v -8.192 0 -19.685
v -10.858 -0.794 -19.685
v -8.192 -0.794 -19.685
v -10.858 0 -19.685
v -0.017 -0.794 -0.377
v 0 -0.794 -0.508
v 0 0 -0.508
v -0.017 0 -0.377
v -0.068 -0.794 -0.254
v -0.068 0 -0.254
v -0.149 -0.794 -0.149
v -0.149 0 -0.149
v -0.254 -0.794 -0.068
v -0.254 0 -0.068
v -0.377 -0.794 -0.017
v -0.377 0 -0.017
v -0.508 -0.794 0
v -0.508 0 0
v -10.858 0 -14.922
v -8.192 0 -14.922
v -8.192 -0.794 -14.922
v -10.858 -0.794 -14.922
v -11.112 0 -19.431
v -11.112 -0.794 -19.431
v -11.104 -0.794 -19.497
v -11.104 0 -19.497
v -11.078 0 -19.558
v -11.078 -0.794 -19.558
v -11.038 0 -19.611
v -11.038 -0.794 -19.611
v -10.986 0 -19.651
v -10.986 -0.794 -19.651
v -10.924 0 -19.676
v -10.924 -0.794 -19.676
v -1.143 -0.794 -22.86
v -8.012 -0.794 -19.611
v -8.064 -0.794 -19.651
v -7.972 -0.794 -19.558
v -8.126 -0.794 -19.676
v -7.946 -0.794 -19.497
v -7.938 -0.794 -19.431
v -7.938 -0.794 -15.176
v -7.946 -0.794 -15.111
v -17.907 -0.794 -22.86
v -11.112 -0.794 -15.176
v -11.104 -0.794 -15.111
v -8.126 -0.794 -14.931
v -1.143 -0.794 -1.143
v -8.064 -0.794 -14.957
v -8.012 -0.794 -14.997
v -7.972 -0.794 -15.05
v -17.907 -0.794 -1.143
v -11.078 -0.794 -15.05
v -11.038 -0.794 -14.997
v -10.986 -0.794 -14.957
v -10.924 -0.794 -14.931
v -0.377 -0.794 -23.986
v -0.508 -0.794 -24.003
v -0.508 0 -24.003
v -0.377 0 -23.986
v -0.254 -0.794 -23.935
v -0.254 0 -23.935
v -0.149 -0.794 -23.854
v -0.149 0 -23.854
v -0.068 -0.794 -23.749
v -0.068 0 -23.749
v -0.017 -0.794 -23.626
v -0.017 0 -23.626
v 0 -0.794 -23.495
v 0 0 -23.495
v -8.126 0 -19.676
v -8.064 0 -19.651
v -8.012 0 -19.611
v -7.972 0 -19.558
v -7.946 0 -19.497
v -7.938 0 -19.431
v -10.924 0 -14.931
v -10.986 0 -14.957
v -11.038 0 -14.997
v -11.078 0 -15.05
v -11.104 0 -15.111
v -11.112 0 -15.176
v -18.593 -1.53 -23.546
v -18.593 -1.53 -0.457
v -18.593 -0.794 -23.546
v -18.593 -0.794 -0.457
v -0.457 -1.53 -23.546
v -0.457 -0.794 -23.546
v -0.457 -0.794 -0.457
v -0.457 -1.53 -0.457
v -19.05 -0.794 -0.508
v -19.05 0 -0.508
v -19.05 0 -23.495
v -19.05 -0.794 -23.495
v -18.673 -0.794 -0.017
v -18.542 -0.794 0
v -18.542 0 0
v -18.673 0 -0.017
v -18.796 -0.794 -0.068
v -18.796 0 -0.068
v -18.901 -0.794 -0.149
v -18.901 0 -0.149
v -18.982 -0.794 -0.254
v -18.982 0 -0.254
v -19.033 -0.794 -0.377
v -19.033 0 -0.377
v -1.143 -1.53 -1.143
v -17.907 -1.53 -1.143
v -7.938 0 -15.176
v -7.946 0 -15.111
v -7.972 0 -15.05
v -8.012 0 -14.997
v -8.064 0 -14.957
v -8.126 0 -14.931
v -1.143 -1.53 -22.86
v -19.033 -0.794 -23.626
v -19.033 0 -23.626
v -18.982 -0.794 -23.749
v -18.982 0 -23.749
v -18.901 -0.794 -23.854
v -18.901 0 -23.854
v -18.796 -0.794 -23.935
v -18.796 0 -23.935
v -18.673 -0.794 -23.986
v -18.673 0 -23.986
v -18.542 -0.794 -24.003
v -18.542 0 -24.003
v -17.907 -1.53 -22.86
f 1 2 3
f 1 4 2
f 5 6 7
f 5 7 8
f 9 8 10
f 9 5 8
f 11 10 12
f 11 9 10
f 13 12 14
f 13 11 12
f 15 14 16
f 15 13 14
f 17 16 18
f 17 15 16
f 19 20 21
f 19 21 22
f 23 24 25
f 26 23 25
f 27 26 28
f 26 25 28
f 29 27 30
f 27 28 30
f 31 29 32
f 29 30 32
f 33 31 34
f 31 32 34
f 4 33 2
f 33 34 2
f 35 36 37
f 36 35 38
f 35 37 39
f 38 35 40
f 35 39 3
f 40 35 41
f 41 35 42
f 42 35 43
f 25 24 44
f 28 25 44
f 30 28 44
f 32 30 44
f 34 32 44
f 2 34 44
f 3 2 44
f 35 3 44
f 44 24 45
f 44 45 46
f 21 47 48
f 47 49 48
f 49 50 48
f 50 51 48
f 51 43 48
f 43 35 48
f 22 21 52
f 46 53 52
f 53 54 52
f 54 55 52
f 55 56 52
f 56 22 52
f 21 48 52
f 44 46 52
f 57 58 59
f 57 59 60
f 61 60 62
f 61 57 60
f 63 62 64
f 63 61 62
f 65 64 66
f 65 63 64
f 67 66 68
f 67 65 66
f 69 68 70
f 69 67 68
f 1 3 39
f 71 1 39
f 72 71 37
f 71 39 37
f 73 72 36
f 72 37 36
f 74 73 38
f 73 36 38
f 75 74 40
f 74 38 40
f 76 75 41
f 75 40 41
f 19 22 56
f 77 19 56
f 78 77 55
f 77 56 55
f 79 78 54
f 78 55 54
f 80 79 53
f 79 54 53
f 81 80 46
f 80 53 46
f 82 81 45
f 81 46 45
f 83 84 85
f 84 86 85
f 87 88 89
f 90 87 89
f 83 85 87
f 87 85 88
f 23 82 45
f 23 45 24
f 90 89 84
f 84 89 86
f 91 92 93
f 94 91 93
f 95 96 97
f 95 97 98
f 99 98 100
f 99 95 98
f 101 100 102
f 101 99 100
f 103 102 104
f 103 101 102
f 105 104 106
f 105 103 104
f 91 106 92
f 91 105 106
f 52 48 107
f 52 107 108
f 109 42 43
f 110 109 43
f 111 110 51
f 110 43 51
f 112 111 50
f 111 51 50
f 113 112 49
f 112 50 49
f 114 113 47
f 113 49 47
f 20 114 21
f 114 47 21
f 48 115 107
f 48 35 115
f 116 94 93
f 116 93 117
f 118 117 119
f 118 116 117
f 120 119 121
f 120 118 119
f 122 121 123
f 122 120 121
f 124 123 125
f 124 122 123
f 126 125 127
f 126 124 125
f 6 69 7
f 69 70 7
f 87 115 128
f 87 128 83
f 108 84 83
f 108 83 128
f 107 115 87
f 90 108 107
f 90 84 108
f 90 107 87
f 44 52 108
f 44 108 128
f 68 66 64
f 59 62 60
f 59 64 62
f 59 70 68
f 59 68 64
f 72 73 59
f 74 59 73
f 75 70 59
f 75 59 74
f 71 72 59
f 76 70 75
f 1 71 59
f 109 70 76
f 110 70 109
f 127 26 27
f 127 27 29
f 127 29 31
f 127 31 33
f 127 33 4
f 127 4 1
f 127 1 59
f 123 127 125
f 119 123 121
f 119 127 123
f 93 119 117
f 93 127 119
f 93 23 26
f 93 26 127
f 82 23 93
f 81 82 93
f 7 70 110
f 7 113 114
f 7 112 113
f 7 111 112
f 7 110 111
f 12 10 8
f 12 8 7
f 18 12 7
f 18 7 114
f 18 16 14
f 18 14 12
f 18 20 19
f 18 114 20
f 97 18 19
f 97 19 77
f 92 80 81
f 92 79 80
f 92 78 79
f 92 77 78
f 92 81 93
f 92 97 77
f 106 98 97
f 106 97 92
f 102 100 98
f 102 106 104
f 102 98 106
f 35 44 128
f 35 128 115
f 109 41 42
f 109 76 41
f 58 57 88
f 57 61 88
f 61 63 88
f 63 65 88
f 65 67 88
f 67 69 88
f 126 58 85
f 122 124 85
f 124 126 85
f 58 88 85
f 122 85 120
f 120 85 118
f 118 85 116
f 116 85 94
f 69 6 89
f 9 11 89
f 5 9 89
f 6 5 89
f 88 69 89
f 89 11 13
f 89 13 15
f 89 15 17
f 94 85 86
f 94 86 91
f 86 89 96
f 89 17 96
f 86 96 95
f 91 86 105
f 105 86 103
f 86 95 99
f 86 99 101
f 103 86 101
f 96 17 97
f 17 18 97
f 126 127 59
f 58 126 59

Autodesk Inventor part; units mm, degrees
ref_plane "YZ Plane" through (0, 0, 0) normal (1, 0, 0) x (0, 1, 0)
ref_plane "XZ Plane" through (0, 0, 0) normal (0, 1, 0) x (-1, 0, 0)
ref_plane "XY Plane" through (0, 0, 0) normal (0, 0, 1) x (1, 0, 0)
sketch "Sketch1" plane through (0, 0, 0) normal (0, 1, 0) x (-1, 0, 0)
  line L0 (0, 0) -> (19.05, 0)
  line L1 (19.05, 0) -> (19.05, -24.003)
  line L2 (19.05, -24.003) -> (0, -24.003)
  line L3 (0, -24.003) -> (0, 0)
  dimension "d0" = 24.003
  dimension "d1" = 19.05
extrude "Extrusion1" add sketch "Sketch1" against normal blind 0.7937
fillet "Fillet1" radius 0.508 4 edges at (0, -0.3969, 0) (-19.05, -0.3969, 0) (0, -0.3969, -24.003) (-19.05, -0.3969, -24.003)
sketch "Sketch2" plane through (0, -0.7937, 0) normal (0, -1, 0) x (1, 0, 0)
  line L0 (-18.542, -24.003) -> (-0.508, -24.003) projected
  line L1 (0, -23.495) -> (0, -0.508) projected
  line L2 (-0.508, 0) -> (-18.542, 0) projected
  line L3 (-19.05, -0.508) -> (-19.05, -23.495) projected
  line L4 (-0.4572, -0.4572) -> (-18.5928, -0.4572)
  line L5 (-18.5928, -0.4572) -> (-18.5928, -23.5458)
  line L6 (-18.5928, -23.5458) -> (-0.4572, -23.5458)
  line L7 (-0.4572, -23.5458) -> (-0.4572, -0.4572)
  line L8 (-1.143, -1.143) -> (-17.907, -1.143)
  line L9 (-17.907, -1.143) -> (-17.907, -22.86)
  line L10 (-17.907, -22.86) -> (-1.143, -22.86)
  line L11 (-1.143, -22.86) -> (-1.143, -1.143)
  arc A0 (-19.05, -23.495) -> (-18.542, -24.003) centre (-18.542, -23.495) ccw projected
  arc A1 (-0.508, -24.003) -> (0, -23.495) centre (-0.508, -23.495) ccw projected
  arc A2 (0, -0.508) -> (-0.508, 0) centre (-0.508, -0.508) ccw projected
  arc A3 (-18.542, 0) -> (-19.05, -0.508) centre (-18.542, -0.508) ccw projected
  point P0 (0, 0)
  dimension "d5" = 0.4572
  dimension "d6" = 0.4572
  dimension "d7" = 0.4572
  dimension "d8" = 0.4572
  dimension "d9" = 1.143
  dimension "d10" = 1.143
  dimension "d11" = 1.143
  dimension "d12" = 1.143
extrude "Extrusion2" add sketch "Sketch2" along normal blind 0.7366 contours L7 L6 L5 L4
sketch "Sketch3" plane through (0, 0, 0) normal (0, 1, 0) x (1, 0, 0)
  arc A0 (-18.542, 24.003) -> (-19.05, 23.495) centre (-18.542, 23.495) ccw projected
  line L0 (-19.05, 23.495) -> (-19.05, 0.508) projected
  arc A1 (-19.05, 0.508) -> (-18.542, 0) centre (-18.542, 0.508) ccw projected
  line L1 (-18.542, 0) -> (-0.508, 0) projected
  arc A2 (-0.508, 0) -> (0, 0.508) centre (-0.508, 0.508) ccw projected
  line L2 (0, 0.508) -> (0, 23.495) projected
  arc A3 (0, 23.495) -> (-0.508, 24.003) centre (-0.508, 23.495) ccw projected
  line L3 (-0.508, 24.003) -> (-18.542, 24.003) projected
  line L4 (-11.1125, 19.685) -> (-7.9375, 19.685)
  line L5 (-7.9375, 19.685) -> (-7.9375, 14.9225)
  line L6 (-7.9375, 14.9225) -> (-11.1125, 14.9225)
  line L7 (-11.1125, 14.9225) -> (-11.1125, 19.685)
  point P0 (0, 0)
  dimension "d15" = 3.175
  dimension "d16" = 4.7625
  dimension "d17" = 19.05
  dimension "d18" = 7.9375
  dimension "d19" = 7.9375
  dimension "d20" = 4.318
extrude "Extrusion3" cut sketch "Sketch3" against normal blind 3.9116 contours L4 L5 L6 L7
fillet "Fillet2" radius 0.254 4 edges at (-11.1125, -0.3969, -19.685) (-7.9375, -0.3969, -19.685) (-7.9375, -0.3969, -14.9225) (-11.1125, -0.3969, -14.9225)
properties part number "Light Sensor Cover V1_3DPrint"
